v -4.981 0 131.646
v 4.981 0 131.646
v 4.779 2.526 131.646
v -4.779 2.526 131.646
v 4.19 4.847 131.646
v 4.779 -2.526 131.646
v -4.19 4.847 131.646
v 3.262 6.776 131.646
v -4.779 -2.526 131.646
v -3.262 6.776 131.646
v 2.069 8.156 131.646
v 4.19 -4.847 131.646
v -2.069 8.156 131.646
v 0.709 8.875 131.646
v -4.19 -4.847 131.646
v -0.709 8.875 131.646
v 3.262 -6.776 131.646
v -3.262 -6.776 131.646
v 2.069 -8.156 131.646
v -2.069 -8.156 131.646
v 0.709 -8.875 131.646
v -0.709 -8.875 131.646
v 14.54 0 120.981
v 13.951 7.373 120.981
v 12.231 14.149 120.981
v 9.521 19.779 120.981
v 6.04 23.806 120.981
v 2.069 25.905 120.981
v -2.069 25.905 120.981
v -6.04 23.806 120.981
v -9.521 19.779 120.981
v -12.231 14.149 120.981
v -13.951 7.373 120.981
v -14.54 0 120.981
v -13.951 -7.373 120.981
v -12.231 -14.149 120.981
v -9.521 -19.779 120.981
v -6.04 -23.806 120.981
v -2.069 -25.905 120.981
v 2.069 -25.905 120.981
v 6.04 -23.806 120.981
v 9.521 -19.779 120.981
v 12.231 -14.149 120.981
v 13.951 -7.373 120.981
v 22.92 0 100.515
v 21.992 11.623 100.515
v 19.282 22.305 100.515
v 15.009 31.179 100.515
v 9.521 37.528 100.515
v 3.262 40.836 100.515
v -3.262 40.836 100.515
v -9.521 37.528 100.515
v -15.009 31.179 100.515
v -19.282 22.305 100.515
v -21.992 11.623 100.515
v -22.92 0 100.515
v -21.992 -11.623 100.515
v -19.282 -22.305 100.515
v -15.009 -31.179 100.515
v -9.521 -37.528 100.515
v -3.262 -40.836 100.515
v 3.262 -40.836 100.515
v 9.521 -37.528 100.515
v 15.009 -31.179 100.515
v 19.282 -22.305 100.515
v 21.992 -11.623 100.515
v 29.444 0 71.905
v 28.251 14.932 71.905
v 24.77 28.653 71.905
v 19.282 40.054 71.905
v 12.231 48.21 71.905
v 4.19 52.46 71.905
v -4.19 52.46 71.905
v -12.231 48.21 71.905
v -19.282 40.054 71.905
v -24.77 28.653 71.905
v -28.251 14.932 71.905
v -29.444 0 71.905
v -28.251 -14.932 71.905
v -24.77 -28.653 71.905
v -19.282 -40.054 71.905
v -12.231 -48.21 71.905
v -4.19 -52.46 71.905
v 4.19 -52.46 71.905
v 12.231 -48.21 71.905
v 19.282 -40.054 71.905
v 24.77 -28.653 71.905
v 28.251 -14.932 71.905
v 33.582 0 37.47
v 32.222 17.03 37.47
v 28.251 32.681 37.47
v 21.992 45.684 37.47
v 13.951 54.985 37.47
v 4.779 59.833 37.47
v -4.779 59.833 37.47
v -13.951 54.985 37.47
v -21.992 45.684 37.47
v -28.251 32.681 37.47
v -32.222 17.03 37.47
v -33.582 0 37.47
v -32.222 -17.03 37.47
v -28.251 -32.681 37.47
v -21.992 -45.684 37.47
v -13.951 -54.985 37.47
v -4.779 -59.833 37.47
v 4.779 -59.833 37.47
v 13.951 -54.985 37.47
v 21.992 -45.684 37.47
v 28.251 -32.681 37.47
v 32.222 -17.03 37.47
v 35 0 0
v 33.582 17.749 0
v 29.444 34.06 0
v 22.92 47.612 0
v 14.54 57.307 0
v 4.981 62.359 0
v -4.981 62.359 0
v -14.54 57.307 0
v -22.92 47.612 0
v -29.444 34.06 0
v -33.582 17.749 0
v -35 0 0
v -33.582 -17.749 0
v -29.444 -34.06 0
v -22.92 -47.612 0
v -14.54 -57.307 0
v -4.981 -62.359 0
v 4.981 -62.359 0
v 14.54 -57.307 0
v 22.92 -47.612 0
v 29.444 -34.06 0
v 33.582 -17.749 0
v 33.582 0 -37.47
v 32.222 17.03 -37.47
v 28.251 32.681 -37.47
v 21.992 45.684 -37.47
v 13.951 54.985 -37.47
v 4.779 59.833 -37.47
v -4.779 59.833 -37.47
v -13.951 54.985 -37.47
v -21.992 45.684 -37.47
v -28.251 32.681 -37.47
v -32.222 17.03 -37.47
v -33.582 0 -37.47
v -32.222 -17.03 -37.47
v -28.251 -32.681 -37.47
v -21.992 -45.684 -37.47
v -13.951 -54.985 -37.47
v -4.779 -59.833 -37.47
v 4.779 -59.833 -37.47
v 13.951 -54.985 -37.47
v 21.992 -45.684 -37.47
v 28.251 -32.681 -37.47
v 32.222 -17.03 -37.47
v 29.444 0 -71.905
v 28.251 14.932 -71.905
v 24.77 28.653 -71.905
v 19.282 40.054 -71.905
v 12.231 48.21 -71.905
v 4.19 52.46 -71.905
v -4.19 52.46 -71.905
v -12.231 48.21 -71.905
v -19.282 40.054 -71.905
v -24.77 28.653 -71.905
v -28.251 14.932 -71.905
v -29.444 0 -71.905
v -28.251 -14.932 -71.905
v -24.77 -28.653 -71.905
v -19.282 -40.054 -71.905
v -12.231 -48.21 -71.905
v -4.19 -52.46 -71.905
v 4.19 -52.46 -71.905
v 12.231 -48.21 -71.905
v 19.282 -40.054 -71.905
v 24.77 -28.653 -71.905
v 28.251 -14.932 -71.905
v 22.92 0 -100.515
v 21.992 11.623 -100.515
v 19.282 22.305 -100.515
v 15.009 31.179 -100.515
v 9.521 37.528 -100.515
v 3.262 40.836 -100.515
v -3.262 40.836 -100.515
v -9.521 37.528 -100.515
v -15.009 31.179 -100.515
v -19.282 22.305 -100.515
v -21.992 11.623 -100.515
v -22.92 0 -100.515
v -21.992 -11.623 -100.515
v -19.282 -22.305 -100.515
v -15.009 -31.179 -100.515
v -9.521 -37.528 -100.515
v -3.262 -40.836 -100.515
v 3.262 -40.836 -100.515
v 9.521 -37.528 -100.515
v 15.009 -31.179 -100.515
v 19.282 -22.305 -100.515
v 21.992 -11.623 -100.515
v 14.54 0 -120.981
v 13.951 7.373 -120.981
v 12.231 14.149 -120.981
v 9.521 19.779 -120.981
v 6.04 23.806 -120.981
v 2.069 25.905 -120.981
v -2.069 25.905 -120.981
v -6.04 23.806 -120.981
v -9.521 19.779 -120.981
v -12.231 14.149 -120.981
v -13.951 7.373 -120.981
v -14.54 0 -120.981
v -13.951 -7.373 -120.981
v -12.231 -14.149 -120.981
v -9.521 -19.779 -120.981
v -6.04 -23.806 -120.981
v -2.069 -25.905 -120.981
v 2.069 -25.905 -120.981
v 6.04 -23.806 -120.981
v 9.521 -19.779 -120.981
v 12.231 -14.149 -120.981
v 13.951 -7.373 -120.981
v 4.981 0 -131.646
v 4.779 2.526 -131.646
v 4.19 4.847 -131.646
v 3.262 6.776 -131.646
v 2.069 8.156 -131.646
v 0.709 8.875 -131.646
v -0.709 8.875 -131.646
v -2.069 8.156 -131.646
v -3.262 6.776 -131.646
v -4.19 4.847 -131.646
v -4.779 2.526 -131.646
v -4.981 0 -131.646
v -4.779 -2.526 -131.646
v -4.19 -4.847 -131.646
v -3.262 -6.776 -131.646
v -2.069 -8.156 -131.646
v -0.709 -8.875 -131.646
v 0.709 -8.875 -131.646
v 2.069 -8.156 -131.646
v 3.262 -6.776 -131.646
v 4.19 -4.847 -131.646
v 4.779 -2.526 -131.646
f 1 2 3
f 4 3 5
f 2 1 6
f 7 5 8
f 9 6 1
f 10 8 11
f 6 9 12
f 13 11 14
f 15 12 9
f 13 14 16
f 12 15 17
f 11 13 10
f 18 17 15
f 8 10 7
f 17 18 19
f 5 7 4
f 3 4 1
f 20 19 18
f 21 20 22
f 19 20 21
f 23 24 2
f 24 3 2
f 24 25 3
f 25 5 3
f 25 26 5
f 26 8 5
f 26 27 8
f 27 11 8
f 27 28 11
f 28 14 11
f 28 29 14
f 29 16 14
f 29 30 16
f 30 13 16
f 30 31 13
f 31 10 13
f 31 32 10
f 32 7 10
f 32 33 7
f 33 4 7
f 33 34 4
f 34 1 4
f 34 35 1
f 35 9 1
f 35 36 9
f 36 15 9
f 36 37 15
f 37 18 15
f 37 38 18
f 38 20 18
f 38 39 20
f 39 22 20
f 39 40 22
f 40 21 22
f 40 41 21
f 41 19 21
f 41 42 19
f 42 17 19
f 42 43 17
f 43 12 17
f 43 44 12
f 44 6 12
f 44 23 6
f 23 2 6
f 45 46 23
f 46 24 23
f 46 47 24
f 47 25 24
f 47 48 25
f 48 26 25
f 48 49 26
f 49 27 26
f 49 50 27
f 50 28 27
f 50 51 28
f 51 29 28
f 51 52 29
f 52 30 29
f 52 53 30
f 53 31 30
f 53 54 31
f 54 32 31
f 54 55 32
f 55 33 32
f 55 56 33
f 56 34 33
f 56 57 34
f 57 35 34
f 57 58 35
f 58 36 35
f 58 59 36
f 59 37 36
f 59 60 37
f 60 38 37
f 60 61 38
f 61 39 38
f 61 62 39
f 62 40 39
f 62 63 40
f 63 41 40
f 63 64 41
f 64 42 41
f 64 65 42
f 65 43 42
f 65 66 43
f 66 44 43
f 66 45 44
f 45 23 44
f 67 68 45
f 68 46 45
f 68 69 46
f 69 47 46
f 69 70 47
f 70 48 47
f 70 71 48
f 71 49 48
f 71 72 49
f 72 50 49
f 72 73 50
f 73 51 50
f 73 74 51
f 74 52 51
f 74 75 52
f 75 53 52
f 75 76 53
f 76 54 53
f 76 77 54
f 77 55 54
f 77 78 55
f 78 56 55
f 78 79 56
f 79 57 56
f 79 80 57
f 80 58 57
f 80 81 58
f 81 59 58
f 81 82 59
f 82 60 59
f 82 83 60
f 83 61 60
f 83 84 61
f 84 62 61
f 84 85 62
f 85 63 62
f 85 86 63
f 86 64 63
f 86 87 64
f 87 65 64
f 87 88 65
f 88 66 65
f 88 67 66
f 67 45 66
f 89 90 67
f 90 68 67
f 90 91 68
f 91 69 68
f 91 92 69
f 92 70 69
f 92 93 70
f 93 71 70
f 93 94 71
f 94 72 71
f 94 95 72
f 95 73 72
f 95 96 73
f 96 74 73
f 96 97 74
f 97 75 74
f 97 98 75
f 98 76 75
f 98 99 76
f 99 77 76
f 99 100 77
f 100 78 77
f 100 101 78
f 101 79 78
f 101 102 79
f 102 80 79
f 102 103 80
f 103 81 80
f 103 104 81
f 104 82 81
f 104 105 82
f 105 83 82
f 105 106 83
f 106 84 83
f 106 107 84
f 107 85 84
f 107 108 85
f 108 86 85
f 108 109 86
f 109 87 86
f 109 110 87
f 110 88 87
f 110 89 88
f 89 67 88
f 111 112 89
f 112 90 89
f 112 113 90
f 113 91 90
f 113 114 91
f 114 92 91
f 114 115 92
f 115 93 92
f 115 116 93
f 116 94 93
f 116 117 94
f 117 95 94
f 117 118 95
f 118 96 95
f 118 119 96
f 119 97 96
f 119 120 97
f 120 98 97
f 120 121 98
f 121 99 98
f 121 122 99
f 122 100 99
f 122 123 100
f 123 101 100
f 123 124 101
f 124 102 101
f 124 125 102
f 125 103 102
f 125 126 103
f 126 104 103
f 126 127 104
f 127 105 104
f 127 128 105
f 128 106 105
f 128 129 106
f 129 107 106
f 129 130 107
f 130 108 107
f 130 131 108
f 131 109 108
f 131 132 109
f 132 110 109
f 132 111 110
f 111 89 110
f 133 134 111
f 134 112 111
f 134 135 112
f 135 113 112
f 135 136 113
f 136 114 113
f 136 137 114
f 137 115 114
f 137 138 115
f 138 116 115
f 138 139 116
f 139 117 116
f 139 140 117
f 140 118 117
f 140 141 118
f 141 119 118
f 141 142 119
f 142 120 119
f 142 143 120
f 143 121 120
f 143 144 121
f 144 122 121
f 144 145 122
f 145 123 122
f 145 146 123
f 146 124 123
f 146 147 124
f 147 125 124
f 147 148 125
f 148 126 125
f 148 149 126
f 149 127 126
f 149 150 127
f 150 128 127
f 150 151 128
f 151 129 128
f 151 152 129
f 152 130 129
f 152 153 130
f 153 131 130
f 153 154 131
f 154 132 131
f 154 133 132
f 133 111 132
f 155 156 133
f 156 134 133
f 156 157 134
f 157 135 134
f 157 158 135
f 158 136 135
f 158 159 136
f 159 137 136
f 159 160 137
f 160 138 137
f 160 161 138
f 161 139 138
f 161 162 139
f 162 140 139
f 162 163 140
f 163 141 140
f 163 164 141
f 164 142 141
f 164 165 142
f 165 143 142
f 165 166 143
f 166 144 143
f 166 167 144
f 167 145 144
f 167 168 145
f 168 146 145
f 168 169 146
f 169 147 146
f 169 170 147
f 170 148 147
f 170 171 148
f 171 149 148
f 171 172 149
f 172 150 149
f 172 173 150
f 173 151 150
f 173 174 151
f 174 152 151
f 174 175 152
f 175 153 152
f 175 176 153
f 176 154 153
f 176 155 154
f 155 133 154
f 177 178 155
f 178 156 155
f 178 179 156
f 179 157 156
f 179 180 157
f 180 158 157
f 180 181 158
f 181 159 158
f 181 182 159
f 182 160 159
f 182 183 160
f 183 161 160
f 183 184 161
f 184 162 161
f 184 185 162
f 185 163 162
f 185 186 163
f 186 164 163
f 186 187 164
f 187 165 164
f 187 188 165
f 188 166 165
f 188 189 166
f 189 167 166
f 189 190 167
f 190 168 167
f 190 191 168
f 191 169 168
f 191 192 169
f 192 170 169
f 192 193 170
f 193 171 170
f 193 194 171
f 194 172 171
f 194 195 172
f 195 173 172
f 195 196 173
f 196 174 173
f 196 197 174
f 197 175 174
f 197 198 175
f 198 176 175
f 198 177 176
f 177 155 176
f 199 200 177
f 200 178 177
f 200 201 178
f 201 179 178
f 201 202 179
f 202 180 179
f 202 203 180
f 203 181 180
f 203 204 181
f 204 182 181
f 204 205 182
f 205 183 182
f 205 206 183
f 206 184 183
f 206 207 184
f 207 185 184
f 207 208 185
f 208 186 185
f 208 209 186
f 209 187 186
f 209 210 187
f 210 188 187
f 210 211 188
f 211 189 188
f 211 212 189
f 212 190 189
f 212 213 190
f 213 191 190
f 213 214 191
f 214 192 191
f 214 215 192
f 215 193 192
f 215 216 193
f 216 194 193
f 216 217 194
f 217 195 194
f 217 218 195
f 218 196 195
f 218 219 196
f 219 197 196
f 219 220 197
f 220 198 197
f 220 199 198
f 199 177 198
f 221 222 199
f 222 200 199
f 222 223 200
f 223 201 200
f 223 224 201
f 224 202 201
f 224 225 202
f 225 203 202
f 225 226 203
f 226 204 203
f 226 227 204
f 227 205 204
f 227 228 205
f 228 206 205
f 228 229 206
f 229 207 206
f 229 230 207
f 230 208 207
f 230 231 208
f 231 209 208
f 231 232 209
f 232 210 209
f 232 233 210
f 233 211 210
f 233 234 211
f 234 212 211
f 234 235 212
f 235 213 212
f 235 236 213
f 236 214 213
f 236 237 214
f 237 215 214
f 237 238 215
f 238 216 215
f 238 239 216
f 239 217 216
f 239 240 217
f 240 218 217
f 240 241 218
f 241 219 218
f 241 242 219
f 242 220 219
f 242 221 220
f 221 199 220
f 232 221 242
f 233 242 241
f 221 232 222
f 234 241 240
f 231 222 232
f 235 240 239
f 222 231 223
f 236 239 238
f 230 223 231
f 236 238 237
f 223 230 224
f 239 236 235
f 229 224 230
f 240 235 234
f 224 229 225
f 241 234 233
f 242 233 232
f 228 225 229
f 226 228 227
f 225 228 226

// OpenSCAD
// Generated by SolidPython 1.0.1 on 2020-07-29 00:46:46


scale(v = [5, 9, 19]) {
	sphere(r = 7);
}
/***********************************************
*********      SolidPython code:      **********
************************************************
 
# import packages: SolidPython
from solid import *
from solid.utils import *
from itertools import chain, combinations, permutations


class Resize:

    def __init__(self, scad_file):
        self.scad_file = scad_file
        #self.scad_file = import_scad(scad_file)
        # cone/cylinder param:
        self.r1 = 0
        self.r2 = 0
        self.h = 0
        # rectangular prism param:
        self.w = 0
        self.l = 0
        # ellipse param:
        self.r = 0

    # import OpenScad code (file name corresponds to shape)


    # classify shape + parameters
    def assign(self, param1, param2, param3):
        if self.scad_file == 'cone.scad':
            self.r1 = param1
            self.r2 = param2
            self.h = param3
        elif self.scad_file == 'cylinder.scad':
            self.r1 = param1
            self.r2 = param2
            self.h = param3
        elif self.scad_file == 'rectangularPrism.scad':
            self.h = param1
            self.l = param2
            self.w = param3
        else:
            self.r = param1
            self.h = param2

    # resize parameters
    def iterate(self):
        x = range(3, 20, 2)
        i = 1
        if self.scad_file == 'cone.scad':
            tempList = list(permutations(x, 2))
            for temp in tempList:
                param1 = temp[0]
                param2 = temp[1]
                filepath = 'produced_scad_files/' + 'cone' + str(param1) + '_' + str(param2) + '_' + '.scad'
                scad_render_to_file(cylinder(h=param1, r1=param2, r2=0), filepath)

        elif self.scad_file == 'cylinder.scad':
            tempList = list(permutations(x, 3))
            for temp in tempList:
                param1 = temp[0]
                param2 = temp[1]
                filepath = 'produced_scad_files/' + 'cylinder' + str(param1) + '_' + str(param2) + '_' + '.scad'
                scad_render_to_file(cylinder(h=param1, r1=param2, r2=param2), filepath)

        elif self.scad_file == 'rectangularPrism.scad':
            tempList = list(permutations(x, 3))
            for temp in tempList:
                param1 = temp[0]
                param2 = temp[1]
                param3 = temp[2]
                filepath = 'produced_scad_files/' + 'rectangularPrism' + str(param1) + '_' + str(param2) + '_' + str(
                    param3) + '.scad'
                scad_render_to_file(cube(size=(param1, param2, param3)), filepath)

        elif self.scad_file == 'ellipse.scad':
            tempList = list(permutations(x, 4))
            for temp in tempList:
                param1 = temp[0]
                param2 = temp[1]
                param3 = temp[2]
                param4 = temp[3]
                filepath = 'produced_scad_files/' + 'ellipse' + str(param1) + '_' + str(param2) + '_' + str(param3) + '_' + str(param4) + '.scad'
                scad_render_to_file(scale([param1, param2, param3])(sphere(r=param4)), filepath)

    def render_to_scadfile(self):
        scad_render_to_file(scad, 'example.scad') 
 
************************************************/
